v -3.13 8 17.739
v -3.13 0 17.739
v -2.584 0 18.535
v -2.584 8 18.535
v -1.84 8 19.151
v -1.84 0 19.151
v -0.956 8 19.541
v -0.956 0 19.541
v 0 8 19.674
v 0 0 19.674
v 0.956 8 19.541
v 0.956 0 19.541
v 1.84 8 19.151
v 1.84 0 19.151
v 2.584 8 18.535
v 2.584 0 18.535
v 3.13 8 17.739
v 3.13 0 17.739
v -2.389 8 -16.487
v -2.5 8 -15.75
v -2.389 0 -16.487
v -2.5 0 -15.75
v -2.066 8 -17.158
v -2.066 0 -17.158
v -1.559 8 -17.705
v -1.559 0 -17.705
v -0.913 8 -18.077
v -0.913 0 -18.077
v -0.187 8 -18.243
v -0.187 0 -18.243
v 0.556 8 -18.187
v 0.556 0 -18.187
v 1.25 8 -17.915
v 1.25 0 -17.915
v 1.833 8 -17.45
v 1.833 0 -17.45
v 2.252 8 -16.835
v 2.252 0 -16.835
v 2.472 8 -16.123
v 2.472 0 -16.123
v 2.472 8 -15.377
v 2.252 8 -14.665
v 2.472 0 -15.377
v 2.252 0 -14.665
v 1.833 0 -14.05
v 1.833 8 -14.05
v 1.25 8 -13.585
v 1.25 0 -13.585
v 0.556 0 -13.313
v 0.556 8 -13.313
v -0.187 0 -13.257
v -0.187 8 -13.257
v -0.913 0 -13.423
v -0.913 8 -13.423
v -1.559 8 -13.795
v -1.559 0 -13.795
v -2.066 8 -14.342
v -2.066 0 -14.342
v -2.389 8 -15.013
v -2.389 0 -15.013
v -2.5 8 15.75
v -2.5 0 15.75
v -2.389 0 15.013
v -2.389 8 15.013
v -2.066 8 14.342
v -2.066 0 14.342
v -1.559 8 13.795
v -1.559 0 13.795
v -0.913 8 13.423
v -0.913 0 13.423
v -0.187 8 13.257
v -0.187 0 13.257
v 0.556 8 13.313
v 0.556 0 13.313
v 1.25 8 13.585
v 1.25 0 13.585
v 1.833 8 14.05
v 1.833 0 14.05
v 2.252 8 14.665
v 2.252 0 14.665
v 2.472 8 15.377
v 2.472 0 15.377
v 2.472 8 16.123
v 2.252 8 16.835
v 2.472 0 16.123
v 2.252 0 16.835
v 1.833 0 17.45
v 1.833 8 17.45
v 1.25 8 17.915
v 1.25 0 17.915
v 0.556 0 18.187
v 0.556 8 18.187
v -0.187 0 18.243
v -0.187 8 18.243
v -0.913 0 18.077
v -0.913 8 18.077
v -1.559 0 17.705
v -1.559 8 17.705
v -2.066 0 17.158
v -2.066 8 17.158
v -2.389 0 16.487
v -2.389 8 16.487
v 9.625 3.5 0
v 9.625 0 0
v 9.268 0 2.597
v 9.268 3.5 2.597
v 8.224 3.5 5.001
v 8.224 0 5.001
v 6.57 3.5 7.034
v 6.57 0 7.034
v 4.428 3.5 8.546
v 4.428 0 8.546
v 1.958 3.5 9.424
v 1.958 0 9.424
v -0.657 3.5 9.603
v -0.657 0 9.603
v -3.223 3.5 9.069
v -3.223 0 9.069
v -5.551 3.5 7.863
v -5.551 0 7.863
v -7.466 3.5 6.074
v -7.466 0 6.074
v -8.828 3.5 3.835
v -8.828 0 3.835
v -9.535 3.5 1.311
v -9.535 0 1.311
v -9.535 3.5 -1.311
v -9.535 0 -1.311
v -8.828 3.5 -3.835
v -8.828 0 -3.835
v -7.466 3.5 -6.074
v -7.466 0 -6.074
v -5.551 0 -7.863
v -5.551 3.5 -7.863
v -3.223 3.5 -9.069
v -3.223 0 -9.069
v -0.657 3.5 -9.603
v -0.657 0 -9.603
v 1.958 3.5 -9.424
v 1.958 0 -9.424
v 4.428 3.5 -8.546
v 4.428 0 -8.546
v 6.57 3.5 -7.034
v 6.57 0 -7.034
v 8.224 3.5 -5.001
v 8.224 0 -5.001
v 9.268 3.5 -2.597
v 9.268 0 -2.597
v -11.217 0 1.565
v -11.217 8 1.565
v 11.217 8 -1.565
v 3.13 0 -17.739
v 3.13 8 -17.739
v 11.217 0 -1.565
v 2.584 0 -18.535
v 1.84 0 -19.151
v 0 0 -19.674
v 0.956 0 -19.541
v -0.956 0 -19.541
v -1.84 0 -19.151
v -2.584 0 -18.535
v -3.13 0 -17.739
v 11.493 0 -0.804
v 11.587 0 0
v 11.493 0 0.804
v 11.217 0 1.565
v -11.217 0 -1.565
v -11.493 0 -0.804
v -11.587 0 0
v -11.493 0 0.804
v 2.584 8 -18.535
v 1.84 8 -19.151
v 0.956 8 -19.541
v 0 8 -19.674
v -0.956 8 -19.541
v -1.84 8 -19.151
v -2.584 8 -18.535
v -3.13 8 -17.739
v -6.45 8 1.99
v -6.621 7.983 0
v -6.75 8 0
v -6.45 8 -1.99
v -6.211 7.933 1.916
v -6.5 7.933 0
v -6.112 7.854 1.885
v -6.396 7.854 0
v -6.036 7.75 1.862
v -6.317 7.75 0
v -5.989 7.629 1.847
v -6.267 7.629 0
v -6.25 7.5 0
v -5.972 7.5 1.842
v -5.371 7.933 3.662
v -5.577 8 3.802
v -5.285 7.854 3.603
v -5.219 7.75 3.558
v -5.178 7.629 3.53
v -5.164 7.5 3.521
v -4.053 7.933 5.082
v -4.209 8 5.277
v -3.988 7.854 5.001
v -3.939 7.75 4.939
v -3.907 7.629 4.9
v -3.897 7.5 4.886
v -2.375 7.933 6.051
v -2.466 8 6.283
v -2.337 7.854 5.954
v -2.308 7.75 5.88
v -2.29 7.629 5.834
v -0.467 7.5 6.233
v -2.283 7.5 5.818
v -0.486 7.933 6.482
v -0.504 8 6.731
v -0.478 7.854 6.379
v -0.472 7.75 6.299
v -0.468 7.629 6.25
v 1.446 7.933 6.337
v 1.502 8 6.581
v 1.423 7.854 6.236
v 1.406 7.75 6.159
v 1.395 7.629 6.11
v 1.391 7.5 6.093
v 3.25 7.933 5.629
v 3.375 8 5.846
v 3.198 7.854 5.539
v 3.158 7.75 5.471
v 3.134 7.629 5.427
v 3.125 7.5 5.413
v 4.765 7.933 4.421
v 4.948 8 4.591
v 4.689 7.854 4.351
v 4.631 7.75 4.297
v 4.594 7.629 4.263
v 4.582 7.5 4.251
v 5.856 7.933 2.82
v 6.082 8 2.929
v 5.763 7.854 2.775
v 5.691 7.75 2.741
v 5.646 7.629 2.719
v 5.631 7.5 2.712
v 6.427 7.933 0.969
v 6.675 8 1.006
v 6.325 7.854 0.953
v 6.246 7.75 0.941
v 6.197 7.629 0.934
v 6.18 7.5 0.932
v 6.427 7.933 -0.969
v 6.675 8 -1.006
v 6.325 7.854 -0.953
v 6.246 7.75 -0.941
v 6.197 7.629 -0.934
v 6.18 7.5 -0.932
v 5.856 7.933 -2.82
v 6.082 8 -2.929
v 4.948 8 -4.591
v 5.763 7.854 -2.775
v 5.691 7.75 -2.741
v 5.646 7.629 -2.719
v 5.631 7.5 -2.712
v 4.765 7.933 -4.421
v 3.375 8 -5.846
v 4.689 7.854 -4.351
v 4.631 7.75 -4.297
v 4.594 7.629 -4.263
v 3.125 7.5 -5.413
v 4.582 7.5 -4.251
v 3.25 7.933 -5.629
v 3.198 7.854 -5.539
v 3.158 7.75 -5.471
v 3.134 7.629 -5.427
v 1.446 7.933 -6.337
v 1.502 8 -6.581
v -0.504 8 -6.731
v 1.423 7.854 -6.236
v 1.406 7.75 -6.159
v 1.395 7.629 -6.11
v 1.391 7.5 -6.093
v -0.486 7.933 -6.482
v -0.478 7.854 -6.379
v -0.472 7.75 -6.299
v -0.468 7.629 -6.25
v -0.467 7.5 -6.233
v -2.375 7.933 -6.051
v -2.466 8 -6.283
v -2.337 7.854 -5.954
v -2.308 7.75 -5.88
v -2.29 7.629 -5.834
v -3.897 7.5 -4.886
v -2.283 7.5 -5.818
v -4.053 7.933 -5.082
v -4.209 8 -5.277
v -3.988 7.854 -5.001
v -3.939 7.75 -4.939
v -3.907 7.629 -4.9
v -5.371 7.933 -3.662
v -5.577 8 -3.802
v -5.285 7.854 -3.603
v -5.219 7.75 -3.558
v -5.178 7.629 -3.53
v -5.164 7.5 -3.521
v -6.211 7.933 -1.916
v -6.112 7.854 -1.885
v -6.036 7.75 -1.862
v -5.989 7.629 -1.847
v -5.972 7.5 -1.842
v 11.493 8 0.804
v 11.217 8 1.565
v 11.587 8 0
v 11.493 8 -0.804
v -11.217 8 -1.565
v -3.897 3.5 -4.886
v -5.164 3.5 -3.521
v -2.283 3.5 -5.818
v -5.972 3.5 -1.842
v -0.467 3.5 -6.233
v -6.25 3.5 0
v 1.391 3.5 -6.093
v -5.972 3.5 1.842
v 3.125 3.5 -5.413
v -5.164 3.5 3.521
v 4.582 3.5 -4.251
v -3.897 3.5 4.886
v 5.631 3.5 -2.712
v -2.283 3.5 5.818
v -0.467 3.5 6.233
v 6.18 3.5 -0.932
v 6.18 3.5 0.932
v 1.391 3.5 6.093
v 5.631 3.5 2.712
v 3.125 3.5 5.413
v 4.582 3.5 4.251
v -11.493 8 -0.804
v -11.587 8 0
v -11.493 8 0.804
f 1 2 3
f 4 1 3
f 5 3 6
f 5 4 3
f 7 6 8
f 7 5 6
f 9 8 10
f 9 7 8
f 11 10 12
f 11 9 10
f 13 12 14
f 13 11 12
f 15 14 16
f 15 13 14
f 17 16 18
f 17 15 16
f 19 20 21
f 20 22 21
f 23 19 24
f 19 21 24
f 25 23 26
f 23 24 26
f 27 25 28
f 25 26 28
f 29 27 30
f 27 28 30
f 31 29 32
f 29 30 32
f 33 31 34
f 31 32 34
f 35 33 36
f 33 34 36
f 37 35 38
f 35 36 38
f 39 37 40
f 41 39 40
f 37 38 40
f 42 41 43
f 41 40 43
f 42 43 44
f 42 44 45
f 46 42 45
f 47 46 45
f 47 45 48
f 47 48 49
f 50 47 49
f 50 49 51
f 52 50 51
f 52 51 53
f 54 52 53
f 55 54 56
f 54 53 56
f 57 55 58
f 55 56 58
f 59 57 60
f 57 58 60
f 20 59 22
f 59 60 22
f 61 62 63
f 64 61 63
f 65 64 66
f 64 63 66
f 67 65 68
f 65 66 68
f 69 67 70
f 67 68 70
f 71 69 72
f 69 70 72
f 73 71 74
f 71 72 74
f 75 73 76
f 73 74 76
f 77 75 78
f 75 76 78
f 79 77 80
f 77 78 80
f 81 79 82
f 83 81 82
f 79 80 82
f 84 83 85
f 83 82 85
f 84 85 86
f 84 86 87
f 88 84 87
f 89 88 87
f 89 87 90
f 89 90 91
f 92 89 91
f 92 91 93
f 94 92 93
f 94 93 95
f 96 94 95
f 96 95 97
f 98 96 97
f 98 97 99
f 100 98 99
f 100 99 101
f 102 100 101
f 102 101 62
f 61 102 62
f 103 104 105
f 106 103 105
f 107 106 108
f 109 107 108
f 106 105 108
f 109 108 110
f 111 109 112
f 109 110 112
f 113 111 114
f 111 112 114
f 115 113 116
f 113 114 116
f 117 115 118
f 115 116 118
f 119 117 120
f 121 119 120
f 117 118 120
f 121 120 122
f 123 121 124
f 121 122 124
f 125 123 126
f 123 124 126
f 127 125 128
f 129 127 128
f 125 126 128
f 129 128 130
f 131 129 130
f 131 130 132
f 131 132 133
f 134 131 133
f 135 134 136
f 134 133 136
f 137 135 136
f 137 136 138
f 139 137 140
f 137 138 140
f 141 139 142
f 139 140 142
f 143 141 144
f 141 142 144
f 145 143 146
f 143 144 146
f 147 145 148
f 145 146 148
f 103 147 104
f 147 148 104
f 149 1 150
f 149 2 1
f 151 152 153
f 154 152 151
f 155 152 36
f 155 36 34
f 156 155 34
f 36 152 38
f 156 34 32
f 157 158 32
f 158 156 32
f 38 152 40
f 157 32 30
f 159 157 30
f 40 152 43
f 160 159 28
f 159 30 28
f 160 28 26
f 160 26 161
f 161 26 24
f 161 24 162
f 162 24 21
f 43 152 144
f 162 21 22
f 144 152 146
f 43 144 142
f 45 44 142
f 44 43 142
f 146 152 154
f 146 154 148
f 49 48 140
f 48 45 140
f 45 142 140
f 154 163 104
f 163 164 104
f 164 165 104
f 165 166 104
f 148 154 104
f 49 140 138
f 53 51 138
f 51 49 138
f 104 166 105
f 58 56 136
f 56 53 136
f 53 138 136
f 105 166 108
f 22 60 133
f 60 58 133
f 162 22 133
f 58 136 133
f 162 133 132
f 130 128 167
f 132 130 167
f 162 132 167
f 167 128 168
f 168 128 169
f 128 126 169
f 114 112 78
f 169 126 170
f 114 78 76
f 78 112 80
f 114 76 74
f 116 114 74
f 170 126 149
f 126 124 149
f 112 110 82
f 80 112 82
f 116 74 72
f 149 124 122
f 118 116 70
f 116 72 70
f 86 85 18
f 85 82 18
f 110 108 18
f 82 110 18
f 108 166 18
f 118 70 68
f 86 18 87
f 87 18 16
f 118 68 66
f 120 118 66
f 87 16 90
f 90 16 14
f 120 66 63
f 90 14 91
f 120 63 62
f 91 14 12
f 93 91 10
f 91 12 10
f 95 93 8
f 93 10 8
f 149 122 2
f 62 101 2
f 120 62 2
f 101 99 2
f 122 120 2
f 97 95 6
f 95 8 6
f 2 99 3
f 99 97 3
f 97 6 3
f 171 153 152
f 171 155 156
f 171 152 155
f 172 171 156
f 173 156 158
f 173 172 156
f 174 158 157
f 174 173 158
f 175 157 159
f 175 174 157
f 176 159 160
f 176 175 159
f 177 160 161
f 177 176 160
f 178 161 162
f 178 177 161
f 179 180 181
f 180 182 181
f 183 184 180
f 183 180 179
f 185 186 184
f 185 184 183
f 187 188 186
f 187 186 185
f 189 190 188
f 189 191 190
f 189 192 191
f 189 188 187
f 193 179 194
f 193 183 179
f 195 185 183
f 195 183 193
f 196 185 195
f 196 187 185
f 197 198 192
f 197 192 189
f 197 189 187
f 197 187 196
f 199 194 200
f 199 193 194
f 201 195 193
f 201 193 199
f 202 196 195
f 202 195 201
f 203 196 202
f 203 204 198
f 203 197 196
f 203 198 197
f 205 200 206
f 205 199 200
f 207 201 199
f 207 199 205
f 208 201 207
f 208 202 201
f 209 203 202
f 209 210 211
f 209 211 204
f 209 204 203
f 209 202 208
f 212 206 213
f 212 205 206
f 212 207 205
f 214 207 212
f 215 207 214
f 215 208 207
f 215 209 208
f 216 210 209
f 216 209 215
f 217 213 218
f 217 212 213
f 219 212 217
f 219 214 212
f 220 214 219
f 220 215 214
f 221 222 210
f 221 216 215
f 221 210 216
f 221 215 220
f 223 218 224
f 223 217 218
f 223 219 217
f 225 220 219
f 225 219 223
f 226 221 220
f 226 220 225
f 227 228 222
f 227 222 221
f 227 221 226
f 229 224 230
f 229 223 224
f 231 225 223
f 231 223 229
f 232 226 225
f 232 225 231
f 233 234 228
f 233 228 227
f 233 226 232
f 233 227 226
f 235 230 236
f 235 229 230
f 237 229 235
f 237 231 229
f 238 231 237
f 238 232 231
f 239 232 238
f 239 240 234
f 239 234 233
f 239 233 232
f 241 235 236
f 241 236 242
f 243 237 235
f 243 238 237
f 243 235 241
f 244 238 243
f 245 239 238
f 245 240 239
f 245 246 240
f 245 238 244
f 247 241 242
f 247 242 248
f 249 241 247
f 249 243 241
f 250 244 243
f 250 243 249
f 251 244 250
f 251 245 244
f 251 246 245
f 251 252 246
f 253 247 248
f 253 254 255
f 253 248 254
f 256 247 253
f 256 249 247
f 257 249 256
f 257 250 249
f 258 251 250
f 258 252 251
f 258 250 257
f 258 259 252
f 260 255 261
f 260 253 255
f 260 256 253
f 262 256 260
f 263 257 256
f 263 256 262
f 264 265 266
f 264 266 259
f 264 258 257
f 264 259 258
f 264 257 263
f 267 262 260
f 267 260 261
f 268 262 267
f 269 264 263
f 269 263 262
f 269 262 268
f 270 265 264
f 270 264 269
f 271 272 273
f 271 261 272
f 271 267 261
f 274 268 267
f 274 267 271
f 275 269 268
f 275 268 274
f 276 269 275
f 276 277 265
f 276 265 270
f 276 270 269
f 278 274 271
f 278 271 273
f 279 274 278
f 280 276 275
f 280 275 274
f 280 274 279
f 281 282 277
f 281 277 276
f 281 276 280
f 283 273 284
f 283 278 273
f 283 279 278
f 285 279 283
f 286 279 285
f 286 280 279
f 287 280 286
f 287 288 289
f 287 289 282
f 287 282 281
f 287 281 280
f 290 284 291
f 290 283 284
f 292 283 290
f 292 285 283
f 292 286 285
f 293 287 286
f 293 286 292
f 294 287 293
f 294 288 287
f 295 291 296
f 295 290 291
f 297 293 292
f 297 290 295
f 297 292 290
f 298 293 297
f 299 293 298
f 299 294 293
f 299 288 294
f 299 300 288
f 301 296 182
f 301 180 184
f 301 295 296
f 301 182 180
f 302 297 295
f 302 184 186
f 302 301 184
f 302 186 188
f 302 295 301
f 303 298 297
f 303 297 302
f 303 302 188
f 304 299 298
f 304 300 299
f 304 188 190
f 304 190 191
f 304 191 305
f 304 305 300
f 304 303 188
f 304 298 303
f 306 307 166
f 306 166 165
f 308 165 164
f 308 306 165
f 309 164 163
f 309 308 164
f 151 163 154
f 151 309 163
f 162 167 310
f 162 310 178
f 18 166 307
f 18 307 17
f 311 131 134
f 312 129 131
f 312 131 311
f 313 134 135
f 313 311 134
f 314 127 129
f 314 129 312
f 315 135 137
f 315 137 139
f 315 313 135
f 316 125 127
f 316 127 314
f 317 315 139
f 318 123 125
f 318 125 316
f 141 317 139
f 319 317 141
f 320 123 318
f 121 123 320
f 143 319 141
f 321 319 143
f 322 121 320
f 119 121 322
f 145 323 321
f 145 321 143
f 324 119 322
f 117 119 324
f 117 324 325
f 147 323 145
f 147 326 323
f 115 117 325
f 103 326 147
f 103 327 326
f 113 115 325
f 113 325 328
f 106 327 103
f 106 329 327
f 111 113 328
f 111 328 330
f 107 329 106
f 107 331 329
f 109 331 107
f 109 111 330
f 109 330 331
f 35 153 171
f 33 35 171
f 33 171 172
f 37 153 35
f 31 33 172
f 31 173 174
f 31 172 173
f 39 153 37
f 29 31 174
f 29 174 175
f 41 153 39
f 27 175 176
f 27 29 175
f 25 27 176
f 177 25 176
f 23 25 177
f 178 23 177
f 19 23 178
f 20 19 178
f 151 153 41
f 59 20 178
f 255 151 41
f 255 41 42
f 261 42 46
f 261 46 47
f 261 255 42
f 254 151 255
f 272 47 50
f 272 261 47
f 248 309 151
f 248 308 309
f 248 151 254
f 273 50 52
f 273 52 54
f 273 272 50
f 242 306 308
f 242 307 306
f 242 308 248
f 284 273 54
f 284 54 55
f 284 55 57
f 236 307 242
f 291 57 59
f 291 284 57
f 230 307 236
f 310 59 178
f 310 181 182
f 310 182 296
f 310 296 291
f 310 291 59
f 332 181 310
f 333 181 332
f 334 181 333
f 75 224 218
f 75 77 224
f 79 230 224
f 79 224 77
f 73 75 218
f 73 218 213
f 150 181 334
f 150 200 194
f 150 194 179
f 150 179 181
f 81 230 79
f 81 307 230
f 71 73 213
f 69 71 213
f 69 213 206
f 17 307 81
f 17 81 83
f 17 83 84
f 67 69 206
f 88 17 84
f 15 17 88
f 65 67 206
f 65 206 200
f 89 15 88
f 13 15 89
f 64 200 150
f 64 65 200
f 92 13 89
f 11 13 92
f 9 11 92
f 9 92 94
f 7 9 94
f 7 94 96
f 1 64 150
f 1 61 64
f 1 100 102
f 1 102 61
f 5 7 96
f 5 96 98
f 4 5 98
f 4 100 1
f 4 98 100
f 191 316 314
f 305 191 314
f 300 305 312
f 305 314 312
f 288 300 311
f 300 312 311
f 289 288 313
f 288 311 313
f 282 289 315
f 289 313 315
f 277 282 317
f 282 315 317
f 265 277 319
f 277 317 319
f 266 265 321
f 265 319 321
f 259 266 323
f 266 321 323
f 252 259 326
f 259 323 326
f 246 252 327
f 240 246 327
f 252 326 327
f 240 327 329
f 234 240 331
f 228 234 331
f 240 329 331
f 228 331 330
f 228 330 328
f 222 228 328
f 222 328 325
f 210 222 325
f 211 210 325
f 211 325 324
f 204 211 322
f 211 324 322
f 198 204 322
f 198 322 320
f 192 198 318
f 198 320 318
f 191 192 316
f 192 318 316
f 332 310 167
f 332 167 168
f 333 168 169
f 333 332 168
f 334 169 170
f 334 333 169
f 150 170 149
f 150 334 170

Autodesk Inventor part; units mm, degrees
ref_plane "YZ Plane" through (0, 0, 0) normal (1, 0, 0) x (0, 1, 0)
ref_plane "XZ Plane" through (0, 0, 0) normal (0, 1, 0) x (-1, 0, 0)
ref_plane "XY Plane" through (0, 0, 0) normal (0, 0, 1) x (1, 0, 0)
sketch "Sketch1" plane through (0, 0, 0) normal (0, 1, 0) x (-1, 0, 0)
  circle A0 centre (0, 0) radius 6.25
  circle A1 centre (0, -15.75) radius 2.5
  circle A2 centre (0, 15.75) radius 2.5
  line L0 (0, 0) -> (0, -24)
  line L1 (0, 0) -> (0, 24)
  line L2 (0, 0) -> (12, 0)
  line L3 (0, 0) -> (-12, 0)
  line L4 (0, 24) -> (12, 0)
  line L5 (12, 0) -> (0, -24)
  line L6 (0, -24) -> (-12, 0)
  line L7 (-12, 0) -> (0, 24)
  dimension "d0" = 12.5
  dimension "d1" = 5
  dimension "d2" = 5
  dimension "d3" = 15.75
  dimension "d4" = 15.75
  dimension "d5" = 24
  dimension "d6" = 24
  dimension "d7" = 12
  dimension "d8" = 12
extrude "Extrusion1" add sketch "Sketch1" along normal blind 8 contours L2 L5 L0 A1 A0 | A0 L1 A2 L4 L2 | A0 L3 L7 L1 A2 | L0 A1 L6 L3 A0
fillet "Fillet1" radius 3.5 4 edges at (0, 4, 24) (0, 4, -24) (12, 4, 0) (-12, 4, 0)
sketch "Sketch2" plane through (0, 0, 0) normal (0, -1, 0) x (1, 0, 0)
  circle A0 centre (0, 0) radius 6.25 projected
  circle A1 centre (0, 0) radius 9.625
  dimension "d12" = 19.25
extrude "Extrusion2" cut sketch "Sketch2" against normal blind 3.5
fillet "Fillet2" radius 0.5 1 edges at (6.25, 8, 0)
properties part number "no-filter-inlet"
